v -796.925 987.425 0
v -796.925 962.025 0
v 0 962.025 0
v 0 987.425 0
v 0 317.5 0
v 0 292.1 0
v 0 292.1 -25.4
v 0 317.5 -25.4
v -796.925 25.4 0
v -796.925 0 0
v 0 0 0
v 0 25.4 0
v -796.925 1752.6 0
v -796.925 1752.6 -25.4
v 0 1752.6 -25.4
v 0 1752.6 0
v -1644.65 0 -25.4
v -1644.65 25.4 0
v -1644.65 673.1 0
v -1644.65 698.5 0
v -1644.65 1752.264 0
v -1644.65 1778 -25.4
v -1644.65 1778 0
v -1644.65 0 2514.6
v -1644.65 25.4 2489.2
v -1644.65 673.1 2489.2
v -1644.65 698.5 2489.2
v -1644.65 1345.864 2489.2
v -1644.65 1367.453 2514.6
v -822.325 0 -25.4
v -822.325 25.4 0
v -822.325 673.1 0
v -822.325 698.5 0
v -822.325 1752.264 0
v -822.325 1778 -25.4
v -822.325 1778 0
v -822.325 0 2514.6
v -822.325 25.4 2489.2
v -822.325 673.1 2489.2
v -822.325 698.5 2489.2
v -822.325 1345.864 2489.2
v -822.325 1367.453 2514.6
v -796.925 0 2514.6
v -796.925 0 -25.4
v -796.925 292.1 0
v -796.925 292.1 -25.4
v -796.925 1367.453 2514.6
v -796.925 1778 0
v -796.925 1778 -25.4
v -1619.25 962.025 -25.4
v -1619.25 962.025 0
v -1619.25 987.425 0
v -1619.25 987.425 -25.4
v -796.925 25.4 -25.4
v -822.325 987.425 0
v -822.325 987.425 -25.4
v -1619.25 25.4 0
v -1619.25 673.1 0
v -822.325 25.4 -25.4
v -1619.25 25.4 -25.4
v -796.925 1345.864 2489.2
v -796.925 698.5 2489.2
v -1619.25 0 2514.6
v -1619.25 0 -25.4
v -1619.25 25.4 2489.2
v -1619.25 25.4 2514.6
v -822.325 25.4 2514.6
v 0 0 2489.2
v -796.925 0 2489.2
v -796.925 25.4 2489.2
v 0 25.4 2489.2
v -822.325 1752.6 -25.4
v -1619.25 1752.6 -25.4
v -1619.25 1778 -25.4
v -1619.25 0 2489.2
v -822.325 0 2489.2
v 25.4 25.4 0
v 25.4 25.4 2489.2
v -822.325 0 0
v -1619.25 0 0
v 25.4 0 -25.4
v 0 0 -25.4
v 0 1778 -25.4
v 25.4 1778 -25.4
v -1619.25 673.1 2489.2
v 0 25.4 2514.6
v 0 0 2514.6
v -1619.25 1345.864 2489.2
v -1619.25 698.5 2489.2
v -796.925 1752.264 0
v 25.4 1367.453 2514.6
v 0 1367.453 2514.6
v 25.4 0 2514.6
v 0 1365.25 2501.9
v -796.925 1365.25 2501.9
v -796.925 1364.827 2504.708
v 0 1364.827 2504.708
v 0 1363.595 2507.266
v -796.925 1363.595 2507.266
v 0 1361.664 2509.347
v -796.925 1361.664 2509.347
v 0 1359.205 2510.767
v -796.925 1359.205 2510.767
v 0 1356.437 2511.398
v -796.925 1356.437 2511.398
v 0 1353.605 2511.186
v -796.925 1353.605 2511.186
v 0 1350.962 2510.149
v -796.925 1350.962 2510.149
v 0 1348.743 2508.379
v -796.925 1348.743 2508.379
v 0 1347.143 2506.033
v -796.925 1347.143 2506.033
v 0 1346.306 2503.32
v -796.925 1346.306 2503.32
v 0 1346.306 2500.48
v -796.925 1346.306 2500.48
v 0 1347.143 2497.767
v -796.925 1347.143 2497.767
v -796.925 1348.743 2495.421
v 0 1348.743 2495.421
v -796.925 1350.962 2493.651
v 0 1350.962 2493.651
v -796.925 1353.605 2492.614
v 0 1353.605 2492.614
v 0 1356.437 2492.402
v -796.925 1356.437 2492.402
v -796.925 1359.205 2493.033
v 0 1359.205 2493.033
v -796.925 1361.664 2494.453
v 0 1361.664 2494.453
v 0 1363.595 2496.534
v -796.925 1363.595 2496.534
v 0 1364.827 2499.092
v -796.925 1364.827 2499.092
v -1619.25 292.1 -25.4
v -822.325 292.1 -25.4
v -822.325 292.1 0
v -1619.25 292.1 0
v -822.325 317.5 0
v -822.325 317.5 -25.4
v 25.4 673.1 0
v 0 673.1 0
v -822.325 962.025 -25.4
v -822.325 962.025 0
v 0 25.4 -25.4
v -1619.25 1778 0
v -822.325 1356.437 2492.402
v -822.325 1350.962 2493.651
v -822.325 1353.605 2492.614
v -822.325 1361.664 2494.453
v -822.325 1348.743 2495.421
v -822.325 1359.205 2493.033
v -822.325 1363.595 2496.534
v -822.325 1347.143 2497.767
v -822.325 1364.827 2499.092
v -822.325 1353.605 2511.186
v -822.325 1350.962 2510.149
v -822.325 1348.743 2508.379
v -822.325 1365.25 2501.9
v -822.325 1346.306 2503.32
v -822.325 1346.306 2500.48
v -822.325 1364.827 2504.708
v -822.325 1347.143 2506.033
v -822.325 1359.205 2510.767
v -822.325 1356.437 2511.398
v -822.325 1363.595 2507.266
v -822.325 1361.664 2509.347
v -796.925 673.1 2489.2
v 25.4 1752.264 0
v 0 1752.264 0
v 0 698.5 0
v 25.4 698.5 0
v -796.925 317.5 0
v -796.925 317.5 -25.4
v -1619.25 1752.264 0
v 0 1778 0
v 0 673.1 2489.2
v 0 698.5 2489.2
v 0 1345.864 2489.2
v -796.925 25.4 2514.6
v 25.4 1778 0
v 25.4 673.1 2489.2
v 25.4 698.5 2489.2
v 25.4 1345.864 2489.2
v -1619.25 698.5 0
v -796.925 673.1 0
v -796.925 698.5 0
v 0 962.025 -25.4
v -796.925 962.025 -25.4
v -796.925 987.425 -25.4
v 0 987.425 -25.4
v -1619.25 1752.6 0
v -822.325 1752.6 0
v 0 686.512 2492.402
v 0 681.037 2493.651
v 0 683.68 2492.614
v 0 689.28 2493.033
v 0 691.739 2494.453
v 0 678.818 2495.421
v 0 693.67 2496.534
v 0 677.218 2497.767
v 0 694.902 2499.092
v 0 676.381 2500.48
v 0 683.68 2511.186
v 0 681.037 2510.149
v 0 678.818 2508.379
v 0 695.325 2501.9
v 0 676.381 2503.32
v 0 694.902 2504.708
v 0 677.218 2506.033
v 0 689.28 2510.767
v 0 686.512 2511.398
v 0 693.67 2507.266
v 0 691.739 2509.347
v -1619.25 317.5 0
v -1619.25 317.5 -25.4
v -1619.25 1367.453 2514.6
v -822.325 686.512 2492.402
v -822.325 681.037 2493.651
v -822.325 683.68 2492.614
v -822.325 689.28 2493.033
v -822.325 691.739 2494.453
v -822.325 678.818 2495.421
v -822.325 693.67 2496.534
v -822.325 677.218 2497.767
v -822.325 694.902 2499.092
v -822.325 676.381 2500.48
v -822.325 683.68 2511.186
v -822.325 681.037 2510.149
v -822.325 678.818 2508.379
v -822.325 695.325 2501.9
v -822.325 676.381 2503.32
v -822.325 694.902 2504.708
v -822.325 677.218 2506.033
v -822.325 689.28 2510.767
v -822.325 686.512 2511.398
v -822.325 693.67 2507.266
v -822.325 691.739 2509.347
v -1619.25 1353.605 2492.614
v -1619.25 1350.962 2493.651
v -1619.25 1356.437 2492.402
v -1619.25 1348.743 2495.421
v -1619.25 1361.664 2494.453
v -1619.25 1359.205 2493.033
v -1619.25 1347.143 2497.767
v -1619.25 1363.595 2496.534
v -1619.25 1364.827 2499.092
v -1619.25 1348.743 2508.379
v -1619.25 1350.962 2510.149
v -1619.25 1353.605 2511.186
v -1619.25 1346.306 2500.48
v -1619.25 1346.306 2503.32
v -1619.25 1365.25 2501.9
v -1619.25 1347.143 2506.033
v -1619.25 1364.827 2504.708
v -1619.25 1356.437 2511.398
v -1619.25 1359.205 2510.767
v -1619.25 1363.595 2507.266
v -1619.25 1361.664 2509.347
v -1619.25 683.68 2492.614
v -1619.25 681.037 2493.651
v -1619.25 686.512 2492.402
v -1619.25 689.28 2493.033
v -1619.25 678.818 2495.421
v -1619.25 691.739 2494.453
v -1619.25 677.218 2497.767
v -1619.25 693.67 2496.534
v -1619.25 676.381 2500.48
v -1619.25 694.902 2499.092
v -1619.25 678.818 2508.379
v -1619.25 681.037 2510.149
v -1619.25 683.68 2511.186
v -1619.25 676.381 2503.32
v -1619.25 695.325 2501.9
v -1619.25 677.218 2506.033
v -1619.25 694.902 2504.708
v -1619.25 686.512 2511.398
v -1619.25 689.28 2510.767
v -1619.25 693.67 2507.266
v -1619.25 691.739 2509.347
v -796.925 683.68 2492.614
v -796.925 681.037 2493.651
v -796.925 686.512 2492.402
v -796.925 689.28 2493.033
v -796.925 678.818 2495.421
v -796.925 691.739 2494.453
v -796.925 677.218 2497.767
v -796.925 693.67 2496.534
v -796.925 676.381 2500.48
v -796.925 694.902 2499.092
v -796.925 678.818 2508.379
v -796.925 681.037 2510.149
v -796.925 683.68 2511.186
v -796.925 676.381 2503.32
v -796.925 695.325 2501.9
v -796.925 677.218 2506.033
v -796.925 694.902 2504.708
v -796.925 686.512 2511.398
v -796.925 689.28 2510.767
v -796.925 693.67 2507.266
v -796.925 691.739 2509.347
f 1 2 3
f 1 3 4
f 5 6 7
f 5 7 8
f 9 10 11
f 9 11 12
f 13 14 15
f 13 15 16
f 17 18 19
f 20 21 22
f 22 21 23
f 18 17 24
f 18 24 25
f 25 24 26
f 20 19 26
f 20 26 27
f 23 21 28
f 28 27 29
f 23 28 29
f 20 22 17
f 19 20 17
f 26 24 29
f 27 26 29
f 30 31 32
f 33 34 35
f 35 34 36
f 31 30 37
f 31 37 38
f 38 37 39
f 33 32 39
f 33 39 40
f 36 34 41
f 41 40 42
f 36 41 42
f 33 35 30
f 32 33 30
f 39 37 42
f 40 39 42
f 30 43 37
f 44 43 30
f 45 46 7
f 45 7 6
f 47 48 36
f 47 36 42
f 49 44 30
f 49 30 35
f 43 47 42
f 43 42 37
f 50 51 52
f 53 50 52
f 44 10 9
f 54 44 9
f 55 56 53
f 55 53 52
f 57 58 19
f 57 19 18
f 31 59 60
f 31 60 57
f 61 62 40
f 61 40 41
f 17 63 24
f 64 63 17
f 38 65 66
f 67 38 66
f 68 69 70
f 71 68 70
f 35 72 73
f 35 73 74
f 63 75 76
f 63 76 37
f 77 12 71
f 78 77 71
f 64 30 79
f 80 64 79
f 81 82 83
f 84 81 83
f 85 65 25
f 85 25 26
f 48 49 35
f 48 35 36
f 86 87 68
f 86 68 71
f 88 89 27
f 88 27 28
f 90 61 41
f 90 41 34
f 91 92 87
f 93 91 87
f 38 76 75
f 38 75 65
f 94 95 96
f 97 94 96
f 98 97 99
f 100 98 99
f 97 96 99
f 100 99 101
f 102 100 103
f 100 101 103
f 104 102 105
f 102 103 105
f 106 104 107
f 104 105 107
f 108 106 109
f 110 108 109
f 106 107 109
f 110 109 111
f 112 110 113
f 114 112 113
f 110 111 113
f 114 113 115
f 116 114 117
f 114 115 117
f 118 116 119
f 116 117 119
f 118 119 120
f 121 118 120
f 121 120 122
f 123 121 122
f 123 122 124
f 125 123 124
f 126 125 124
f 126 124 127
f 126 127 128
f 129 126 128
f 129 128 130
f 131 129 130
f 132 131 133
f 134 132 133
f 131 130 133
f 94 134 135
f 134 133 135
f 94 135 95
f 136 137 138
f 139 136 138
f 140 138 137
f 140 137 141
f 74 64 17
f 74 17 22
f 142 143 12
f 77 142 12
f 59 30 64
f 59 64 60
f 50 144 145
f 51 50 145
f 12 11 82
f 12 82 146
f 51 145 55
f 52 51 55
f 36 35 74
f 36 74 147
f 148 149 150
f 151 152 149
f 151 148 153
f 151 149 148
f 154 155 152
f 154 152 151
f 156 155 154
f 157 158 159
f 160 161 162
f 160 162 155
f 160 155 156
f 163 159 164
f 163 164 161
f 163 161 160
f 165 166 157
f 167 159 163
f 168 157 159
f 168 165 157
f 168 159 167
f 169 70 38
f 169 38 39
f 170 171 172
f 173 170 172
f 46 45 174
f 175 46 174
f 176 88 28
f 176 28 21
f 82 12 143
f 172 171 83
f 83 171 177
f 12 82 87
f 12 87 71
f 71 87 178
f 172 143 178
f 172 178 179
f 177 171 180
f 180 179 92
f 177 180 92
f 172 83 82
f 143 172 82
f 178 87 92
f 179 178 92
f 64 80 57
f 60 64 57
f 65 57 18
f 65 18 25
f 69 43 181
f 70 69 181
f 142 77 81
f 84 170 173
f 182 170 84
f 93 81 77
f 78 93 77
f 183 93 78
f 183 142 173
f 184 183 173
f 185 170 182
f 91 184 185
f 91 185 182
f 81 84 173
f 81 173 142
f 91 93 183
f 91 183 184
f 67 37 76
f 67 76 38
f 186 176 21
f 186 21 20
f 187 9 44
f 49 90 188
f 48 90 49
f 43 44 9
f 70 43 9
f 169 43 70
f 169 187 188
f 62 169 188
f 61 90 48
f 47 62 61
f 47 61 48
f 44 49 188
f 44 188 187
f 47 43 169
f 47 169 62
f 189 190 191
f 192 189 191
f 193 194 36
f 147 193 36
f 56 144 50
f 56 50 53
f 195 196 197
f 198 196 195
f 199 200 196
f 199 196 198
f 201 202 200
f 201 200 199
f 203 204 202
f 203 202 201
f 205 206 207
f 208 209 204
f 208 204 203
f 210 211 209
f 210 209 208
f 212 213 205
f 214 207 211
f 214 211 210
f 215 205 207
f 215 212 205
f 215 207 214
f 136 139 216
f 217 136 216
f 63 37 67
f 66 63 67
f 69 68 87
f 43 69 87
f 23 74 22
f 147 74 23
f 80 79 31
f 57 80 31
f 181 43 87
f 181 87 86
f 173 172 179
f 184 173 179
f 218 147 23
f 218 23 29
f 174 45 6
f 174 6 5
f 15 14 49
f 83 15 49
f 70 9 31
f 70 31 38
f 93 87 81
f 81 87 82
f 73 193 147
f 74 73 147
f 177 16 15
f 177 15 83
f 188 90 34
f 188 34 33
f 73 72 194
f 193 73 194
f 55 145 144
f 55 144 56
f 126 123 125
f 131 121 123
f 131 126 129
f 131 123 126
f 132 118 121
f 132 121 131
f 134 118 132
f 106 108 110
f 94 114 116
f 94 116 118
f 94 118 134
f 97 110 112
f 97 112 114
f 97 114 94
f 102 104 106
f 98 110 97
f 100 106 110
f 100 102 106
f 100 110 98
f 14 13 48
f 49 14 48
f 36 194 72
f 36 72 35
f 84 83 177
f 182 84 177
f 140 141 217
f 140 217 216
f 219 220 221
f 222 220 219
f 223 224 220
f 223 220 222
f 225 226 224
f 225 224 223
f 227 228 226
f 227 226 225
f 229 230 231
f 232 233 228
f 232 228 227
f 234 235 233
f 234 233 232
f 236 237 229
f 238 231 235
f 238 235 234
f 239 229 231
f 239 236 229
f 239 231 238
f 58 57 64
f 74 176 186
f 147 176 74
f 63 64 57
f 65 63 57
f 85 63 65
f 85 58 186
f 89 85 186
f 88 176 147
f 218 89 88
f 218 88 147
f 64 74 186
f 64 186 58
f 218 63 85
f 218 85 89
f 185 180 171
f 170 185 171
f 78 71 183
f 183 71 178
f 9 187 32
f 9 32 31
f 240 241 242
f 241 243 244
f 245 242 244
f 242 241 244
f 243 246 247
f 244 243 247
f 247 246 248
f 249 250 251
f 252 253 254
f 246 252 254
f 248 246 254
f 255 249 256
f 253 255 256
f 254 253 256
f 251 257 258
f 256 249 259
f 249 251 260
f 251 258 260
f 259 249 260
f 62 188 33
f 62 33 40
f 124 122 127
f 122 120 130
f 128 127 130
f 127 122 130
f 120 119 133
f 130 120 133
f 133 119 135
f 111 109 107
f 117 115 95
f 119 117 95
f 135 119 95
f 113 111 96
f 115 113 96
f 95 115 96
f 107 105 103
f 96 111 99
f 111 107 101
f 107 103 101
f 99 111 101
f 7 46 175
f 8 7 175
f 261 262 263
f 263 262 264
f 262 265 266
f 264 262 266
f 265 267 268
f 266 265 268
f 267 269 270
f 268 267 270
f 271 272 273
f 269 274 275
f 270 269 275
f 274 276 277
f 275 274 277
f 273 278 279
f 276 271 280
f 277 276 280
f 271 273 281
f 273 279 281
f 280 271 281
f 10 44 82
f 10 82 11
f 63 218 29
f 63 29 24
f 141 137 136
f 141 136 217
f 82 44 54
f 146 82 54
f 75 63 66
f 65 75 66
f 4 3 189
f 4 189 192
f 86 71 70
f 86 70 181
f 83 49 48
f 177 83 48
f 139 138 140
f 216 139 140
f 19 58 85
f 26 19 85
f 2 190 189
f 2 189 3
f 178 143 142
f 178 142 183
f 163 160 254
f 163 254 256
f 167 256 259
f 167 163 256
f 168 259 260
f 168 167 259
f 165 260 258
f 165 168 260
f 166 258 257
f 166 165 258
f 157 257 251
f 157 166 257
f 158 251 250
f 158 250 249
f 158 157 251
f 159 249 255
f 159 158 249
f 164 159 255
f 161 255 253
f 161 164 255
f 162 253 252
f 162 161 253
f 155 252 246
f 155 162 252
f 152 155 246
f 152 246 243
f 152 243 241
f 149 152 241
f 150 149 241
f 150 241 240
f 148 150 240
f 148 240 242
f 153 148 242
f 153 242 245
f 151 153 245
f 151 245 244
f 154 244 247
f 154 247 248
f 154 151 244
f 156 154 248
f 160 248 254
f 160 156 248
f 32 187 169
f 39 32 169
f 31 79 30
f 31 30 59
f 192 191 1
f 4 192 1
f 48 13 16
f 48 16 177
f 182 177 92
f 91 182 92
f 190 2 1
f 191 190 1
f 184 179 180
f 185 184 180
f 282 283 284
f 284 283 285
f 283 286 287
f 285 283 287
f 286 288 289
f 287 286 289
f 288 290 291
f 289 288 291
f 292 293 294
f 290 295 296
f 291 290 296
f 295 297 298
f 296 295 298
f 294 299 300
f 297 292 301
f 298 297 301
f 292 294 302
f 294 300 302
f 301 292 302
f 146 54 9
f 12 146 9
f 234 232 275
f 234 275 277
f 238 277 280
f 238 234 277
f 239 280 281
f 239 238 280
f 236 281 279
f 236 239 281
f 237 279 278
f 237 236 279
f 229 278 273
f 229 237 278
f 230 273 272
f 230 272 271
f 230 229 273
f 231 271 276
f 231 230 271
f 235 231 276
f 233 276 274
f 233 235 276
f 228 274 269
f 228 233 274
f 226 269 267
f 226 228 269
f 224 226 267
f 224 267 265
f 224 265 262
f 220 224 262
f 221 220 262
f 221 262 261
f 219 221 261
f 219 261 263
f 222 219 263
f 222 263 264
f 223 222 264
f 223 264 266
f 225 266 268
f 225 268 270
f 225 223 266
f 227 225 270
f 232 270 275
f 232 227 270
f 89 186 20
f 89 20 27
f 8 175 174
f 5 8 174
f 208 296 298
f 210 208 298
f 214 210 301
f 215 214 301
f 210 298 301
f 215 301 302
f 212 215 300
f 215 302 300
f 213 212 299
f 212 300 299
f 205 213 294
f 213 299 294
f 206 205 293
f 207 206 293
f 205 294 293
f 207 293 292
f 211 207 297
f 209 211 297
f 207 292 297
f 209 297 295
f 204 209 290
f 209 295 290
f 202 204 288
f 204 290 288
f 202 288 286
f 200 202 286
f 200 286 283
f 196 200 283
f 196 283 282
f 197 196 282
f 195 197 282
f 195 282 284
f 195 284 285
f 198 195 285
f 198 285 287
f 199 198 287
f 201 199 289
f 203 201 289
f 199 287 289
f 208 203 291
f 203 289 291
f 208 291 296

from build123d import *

# Parameters (mm, degrees)
F0_W     = 25.4
F0_H     = 2489.2
F1_DEPTH = 25.4
F6_W     = 25.4
F6_H     = 25.4
F7_DEPTH = 796.925
F6_R     = 9.525


with BuildPart() as f1:
    # F0 (on Right) → F1 (new body)
    with BuildSketch(Plane.YZ):
        with Locations((12.7, 1244.6)):
            Rectangle(F0_W, F0_H)
        Polygon((25.4, 0), (0, 0), (0, -25.4), (1778, -25.4), (1778, 0), (1752.2637007088, 0), (698.5, 0), (673.1, 0), align=None)
        Polygon((0, 2514.6), (0, 2489.2), (25.4, 2489.2), (673.1, 2489.2), (698.5, 2489.2), (1345.8637007088, 2489.2), (1371.6, 2489.2), (1367.4530612245, 2514.6), align=None)
        Polygon((1752.2637007088, 0), (1778, 0), (1371.6, 2489.2), (1345.8637007088, 2489.2), align=None)
        with Locations((685.8, 1244.6)):
            Rectangle(F0_W, F0_H)
    extrude(amount=F1_DEPTH)


with BuildPart() as f3_1:
    # F3: instance of F1
    add(f1.part.mirror(Plane(origin=(-809.625, 769.7711953275, 1196.3676158974), x_dir=(0, 1, 0), z_dir=(1, 0, 0))))


with BuildPart() as f5_1:
    # F5: instance of F1
    add(f1.part.mirror(Plane(origin=(-398.4625, 769.7711953275, 1196.3676158974), x_dir=(0, 1, 0), z_dir=(1, 0, 0))))


with BuildPart() as f7:
    # F6 (on face) → F7 (new body, through all)
    with BuildSketch(Plane.YZ.offset(-796.925)):
        with Locations((1765.3, -12.7)):
            Rectangle(F6_W, F6_H)
    extrude(amount=F7_DEPTH)


with BuildPart() as f7b:
    # F6 (on face) → F7, piece 2 (new body, through all)
    with BuildSketch(Plane.YZ.offset(-796.925)):
        with Locations((12.7, -12.7)):
            Rectangle(F6_W, F6_H)
    extrude(amount=F7_DEPTH)


with BuildPart() as f7c:
    # F6 (on face) → F7, piece 3 (new body, through all)
    with BuildSketch(Plane.YZ.offset(-796.925)):
        with Locations((12.7, 2501.9)):
            Rectangle(F6_W, F6_H)
    extrude(amount=F7_DEPTH)


with BuildPart() as f7d:
    # F6 (on face) → F7, piece 4 (new body, through all)
    with BuildSketch(Plane.YZ.offset(-796.925)):
        with Locations((304.8, -12.7)):
            Rectangle(F6_W, F6_H)
    extrude(amount=F7_DEPTH)


with BuildPart() as f7e:
    # F6 (on face) → F7, piece 5 (new body, through all)
    with BuildSketch(Plane.YZ.offset(-796.925)):
        with Locations((974.725, -12.7)):
            Rectangle(F6_W, F6_H)
    extrude(amount=F7_DEPTH)


with BuildPart() as f7f:
    # F6 (on face) → F7, piece 6 (new body, through all)
    with BuildSketch(Plane.YZ.offset(-796.925)):
        with Locations((685.8, 2501.9)):
            Circle(F6_R)
    extrude(amount=F7_DEPTH)


with BuildPart() as f7g:
    # F6 (on face) → F7, piece 7 (new body, through all)
    with BuildSketch(Plane.YZ.offset(-796.925)):
        with Locations((1355.725, 2501.9)):
            Circle(F6_R)
    extrude(amount=F7_DEPTH)


with BuildPart() as f9_1:
    # F9: instance of F7c
    add(f7c.part.mirror(Plane(origin=(-809.625, 769.7711953275, 1196.3676158974), x_dir=(0, 1, 0), z_dir=(1, 0, 0))))


with BuildPart() as f9_2:
    # F9: instance of F7f
    add(f7f.part.mirror(Plane(origin=(-809.625, 769.7711953275, 1196.3676158974), x_dir=(0, 1, 0), z_dir=(1, 0, 0))))


with BuildPart() as f9_3:
    # F9: instance of F7g
    add(f7g.part.mirror(Plane(origin=(-809.625, 769.7711953275, 1196.3676158974), x_dir=(0, 1, 0), z_dir=(1, 0, 0))))


with BuildPart() as f9_4:
    # F9: instance of F7
    add(f7.part.mirror(Plane(origin=(-809.625, 769.7711953275, 1196.3676158974), x_dir=(0, 1, 0), z_dir=(1, 0, 0))))


with BuildPart() as f9_5:
    # F9: instance of F7e
    add(f7e.part.mirror(Plane(origin=(-809.625, 769.7711953275, 1196.3676158974), x_dir=(0, 1, 0), z_dir=(1, 0, 0))))


with BuildPart() as f9_6:
    # F9: instance of F7d
    add(f7d.part.mirror(Plane(origin=(-809.625, 769.7711953275, 1196.3676158974), x_dir=(0, 1, 0), z_dir=(1, 0, 0))))


with BuildPart() as f9_7:
    # F9: instance of F7b
    add(f7b.part.mirror(Plane(origin=(-809.625, 769.7711953275, 1196.3676158974), x_dir=(0, 1, 0), z_dir=(1, 0, 0))))


solid = Compound([f1.part, f3_1.part, f5_1.part, f7.part, f7b.part, f7c.part, f7d.part, f7e.part, f7f.part, f7g.part, f9_1.part, f9_2.part, f9_3.part, f9_4.part, f9_5.part, f9_6.part, f9_7.part])
